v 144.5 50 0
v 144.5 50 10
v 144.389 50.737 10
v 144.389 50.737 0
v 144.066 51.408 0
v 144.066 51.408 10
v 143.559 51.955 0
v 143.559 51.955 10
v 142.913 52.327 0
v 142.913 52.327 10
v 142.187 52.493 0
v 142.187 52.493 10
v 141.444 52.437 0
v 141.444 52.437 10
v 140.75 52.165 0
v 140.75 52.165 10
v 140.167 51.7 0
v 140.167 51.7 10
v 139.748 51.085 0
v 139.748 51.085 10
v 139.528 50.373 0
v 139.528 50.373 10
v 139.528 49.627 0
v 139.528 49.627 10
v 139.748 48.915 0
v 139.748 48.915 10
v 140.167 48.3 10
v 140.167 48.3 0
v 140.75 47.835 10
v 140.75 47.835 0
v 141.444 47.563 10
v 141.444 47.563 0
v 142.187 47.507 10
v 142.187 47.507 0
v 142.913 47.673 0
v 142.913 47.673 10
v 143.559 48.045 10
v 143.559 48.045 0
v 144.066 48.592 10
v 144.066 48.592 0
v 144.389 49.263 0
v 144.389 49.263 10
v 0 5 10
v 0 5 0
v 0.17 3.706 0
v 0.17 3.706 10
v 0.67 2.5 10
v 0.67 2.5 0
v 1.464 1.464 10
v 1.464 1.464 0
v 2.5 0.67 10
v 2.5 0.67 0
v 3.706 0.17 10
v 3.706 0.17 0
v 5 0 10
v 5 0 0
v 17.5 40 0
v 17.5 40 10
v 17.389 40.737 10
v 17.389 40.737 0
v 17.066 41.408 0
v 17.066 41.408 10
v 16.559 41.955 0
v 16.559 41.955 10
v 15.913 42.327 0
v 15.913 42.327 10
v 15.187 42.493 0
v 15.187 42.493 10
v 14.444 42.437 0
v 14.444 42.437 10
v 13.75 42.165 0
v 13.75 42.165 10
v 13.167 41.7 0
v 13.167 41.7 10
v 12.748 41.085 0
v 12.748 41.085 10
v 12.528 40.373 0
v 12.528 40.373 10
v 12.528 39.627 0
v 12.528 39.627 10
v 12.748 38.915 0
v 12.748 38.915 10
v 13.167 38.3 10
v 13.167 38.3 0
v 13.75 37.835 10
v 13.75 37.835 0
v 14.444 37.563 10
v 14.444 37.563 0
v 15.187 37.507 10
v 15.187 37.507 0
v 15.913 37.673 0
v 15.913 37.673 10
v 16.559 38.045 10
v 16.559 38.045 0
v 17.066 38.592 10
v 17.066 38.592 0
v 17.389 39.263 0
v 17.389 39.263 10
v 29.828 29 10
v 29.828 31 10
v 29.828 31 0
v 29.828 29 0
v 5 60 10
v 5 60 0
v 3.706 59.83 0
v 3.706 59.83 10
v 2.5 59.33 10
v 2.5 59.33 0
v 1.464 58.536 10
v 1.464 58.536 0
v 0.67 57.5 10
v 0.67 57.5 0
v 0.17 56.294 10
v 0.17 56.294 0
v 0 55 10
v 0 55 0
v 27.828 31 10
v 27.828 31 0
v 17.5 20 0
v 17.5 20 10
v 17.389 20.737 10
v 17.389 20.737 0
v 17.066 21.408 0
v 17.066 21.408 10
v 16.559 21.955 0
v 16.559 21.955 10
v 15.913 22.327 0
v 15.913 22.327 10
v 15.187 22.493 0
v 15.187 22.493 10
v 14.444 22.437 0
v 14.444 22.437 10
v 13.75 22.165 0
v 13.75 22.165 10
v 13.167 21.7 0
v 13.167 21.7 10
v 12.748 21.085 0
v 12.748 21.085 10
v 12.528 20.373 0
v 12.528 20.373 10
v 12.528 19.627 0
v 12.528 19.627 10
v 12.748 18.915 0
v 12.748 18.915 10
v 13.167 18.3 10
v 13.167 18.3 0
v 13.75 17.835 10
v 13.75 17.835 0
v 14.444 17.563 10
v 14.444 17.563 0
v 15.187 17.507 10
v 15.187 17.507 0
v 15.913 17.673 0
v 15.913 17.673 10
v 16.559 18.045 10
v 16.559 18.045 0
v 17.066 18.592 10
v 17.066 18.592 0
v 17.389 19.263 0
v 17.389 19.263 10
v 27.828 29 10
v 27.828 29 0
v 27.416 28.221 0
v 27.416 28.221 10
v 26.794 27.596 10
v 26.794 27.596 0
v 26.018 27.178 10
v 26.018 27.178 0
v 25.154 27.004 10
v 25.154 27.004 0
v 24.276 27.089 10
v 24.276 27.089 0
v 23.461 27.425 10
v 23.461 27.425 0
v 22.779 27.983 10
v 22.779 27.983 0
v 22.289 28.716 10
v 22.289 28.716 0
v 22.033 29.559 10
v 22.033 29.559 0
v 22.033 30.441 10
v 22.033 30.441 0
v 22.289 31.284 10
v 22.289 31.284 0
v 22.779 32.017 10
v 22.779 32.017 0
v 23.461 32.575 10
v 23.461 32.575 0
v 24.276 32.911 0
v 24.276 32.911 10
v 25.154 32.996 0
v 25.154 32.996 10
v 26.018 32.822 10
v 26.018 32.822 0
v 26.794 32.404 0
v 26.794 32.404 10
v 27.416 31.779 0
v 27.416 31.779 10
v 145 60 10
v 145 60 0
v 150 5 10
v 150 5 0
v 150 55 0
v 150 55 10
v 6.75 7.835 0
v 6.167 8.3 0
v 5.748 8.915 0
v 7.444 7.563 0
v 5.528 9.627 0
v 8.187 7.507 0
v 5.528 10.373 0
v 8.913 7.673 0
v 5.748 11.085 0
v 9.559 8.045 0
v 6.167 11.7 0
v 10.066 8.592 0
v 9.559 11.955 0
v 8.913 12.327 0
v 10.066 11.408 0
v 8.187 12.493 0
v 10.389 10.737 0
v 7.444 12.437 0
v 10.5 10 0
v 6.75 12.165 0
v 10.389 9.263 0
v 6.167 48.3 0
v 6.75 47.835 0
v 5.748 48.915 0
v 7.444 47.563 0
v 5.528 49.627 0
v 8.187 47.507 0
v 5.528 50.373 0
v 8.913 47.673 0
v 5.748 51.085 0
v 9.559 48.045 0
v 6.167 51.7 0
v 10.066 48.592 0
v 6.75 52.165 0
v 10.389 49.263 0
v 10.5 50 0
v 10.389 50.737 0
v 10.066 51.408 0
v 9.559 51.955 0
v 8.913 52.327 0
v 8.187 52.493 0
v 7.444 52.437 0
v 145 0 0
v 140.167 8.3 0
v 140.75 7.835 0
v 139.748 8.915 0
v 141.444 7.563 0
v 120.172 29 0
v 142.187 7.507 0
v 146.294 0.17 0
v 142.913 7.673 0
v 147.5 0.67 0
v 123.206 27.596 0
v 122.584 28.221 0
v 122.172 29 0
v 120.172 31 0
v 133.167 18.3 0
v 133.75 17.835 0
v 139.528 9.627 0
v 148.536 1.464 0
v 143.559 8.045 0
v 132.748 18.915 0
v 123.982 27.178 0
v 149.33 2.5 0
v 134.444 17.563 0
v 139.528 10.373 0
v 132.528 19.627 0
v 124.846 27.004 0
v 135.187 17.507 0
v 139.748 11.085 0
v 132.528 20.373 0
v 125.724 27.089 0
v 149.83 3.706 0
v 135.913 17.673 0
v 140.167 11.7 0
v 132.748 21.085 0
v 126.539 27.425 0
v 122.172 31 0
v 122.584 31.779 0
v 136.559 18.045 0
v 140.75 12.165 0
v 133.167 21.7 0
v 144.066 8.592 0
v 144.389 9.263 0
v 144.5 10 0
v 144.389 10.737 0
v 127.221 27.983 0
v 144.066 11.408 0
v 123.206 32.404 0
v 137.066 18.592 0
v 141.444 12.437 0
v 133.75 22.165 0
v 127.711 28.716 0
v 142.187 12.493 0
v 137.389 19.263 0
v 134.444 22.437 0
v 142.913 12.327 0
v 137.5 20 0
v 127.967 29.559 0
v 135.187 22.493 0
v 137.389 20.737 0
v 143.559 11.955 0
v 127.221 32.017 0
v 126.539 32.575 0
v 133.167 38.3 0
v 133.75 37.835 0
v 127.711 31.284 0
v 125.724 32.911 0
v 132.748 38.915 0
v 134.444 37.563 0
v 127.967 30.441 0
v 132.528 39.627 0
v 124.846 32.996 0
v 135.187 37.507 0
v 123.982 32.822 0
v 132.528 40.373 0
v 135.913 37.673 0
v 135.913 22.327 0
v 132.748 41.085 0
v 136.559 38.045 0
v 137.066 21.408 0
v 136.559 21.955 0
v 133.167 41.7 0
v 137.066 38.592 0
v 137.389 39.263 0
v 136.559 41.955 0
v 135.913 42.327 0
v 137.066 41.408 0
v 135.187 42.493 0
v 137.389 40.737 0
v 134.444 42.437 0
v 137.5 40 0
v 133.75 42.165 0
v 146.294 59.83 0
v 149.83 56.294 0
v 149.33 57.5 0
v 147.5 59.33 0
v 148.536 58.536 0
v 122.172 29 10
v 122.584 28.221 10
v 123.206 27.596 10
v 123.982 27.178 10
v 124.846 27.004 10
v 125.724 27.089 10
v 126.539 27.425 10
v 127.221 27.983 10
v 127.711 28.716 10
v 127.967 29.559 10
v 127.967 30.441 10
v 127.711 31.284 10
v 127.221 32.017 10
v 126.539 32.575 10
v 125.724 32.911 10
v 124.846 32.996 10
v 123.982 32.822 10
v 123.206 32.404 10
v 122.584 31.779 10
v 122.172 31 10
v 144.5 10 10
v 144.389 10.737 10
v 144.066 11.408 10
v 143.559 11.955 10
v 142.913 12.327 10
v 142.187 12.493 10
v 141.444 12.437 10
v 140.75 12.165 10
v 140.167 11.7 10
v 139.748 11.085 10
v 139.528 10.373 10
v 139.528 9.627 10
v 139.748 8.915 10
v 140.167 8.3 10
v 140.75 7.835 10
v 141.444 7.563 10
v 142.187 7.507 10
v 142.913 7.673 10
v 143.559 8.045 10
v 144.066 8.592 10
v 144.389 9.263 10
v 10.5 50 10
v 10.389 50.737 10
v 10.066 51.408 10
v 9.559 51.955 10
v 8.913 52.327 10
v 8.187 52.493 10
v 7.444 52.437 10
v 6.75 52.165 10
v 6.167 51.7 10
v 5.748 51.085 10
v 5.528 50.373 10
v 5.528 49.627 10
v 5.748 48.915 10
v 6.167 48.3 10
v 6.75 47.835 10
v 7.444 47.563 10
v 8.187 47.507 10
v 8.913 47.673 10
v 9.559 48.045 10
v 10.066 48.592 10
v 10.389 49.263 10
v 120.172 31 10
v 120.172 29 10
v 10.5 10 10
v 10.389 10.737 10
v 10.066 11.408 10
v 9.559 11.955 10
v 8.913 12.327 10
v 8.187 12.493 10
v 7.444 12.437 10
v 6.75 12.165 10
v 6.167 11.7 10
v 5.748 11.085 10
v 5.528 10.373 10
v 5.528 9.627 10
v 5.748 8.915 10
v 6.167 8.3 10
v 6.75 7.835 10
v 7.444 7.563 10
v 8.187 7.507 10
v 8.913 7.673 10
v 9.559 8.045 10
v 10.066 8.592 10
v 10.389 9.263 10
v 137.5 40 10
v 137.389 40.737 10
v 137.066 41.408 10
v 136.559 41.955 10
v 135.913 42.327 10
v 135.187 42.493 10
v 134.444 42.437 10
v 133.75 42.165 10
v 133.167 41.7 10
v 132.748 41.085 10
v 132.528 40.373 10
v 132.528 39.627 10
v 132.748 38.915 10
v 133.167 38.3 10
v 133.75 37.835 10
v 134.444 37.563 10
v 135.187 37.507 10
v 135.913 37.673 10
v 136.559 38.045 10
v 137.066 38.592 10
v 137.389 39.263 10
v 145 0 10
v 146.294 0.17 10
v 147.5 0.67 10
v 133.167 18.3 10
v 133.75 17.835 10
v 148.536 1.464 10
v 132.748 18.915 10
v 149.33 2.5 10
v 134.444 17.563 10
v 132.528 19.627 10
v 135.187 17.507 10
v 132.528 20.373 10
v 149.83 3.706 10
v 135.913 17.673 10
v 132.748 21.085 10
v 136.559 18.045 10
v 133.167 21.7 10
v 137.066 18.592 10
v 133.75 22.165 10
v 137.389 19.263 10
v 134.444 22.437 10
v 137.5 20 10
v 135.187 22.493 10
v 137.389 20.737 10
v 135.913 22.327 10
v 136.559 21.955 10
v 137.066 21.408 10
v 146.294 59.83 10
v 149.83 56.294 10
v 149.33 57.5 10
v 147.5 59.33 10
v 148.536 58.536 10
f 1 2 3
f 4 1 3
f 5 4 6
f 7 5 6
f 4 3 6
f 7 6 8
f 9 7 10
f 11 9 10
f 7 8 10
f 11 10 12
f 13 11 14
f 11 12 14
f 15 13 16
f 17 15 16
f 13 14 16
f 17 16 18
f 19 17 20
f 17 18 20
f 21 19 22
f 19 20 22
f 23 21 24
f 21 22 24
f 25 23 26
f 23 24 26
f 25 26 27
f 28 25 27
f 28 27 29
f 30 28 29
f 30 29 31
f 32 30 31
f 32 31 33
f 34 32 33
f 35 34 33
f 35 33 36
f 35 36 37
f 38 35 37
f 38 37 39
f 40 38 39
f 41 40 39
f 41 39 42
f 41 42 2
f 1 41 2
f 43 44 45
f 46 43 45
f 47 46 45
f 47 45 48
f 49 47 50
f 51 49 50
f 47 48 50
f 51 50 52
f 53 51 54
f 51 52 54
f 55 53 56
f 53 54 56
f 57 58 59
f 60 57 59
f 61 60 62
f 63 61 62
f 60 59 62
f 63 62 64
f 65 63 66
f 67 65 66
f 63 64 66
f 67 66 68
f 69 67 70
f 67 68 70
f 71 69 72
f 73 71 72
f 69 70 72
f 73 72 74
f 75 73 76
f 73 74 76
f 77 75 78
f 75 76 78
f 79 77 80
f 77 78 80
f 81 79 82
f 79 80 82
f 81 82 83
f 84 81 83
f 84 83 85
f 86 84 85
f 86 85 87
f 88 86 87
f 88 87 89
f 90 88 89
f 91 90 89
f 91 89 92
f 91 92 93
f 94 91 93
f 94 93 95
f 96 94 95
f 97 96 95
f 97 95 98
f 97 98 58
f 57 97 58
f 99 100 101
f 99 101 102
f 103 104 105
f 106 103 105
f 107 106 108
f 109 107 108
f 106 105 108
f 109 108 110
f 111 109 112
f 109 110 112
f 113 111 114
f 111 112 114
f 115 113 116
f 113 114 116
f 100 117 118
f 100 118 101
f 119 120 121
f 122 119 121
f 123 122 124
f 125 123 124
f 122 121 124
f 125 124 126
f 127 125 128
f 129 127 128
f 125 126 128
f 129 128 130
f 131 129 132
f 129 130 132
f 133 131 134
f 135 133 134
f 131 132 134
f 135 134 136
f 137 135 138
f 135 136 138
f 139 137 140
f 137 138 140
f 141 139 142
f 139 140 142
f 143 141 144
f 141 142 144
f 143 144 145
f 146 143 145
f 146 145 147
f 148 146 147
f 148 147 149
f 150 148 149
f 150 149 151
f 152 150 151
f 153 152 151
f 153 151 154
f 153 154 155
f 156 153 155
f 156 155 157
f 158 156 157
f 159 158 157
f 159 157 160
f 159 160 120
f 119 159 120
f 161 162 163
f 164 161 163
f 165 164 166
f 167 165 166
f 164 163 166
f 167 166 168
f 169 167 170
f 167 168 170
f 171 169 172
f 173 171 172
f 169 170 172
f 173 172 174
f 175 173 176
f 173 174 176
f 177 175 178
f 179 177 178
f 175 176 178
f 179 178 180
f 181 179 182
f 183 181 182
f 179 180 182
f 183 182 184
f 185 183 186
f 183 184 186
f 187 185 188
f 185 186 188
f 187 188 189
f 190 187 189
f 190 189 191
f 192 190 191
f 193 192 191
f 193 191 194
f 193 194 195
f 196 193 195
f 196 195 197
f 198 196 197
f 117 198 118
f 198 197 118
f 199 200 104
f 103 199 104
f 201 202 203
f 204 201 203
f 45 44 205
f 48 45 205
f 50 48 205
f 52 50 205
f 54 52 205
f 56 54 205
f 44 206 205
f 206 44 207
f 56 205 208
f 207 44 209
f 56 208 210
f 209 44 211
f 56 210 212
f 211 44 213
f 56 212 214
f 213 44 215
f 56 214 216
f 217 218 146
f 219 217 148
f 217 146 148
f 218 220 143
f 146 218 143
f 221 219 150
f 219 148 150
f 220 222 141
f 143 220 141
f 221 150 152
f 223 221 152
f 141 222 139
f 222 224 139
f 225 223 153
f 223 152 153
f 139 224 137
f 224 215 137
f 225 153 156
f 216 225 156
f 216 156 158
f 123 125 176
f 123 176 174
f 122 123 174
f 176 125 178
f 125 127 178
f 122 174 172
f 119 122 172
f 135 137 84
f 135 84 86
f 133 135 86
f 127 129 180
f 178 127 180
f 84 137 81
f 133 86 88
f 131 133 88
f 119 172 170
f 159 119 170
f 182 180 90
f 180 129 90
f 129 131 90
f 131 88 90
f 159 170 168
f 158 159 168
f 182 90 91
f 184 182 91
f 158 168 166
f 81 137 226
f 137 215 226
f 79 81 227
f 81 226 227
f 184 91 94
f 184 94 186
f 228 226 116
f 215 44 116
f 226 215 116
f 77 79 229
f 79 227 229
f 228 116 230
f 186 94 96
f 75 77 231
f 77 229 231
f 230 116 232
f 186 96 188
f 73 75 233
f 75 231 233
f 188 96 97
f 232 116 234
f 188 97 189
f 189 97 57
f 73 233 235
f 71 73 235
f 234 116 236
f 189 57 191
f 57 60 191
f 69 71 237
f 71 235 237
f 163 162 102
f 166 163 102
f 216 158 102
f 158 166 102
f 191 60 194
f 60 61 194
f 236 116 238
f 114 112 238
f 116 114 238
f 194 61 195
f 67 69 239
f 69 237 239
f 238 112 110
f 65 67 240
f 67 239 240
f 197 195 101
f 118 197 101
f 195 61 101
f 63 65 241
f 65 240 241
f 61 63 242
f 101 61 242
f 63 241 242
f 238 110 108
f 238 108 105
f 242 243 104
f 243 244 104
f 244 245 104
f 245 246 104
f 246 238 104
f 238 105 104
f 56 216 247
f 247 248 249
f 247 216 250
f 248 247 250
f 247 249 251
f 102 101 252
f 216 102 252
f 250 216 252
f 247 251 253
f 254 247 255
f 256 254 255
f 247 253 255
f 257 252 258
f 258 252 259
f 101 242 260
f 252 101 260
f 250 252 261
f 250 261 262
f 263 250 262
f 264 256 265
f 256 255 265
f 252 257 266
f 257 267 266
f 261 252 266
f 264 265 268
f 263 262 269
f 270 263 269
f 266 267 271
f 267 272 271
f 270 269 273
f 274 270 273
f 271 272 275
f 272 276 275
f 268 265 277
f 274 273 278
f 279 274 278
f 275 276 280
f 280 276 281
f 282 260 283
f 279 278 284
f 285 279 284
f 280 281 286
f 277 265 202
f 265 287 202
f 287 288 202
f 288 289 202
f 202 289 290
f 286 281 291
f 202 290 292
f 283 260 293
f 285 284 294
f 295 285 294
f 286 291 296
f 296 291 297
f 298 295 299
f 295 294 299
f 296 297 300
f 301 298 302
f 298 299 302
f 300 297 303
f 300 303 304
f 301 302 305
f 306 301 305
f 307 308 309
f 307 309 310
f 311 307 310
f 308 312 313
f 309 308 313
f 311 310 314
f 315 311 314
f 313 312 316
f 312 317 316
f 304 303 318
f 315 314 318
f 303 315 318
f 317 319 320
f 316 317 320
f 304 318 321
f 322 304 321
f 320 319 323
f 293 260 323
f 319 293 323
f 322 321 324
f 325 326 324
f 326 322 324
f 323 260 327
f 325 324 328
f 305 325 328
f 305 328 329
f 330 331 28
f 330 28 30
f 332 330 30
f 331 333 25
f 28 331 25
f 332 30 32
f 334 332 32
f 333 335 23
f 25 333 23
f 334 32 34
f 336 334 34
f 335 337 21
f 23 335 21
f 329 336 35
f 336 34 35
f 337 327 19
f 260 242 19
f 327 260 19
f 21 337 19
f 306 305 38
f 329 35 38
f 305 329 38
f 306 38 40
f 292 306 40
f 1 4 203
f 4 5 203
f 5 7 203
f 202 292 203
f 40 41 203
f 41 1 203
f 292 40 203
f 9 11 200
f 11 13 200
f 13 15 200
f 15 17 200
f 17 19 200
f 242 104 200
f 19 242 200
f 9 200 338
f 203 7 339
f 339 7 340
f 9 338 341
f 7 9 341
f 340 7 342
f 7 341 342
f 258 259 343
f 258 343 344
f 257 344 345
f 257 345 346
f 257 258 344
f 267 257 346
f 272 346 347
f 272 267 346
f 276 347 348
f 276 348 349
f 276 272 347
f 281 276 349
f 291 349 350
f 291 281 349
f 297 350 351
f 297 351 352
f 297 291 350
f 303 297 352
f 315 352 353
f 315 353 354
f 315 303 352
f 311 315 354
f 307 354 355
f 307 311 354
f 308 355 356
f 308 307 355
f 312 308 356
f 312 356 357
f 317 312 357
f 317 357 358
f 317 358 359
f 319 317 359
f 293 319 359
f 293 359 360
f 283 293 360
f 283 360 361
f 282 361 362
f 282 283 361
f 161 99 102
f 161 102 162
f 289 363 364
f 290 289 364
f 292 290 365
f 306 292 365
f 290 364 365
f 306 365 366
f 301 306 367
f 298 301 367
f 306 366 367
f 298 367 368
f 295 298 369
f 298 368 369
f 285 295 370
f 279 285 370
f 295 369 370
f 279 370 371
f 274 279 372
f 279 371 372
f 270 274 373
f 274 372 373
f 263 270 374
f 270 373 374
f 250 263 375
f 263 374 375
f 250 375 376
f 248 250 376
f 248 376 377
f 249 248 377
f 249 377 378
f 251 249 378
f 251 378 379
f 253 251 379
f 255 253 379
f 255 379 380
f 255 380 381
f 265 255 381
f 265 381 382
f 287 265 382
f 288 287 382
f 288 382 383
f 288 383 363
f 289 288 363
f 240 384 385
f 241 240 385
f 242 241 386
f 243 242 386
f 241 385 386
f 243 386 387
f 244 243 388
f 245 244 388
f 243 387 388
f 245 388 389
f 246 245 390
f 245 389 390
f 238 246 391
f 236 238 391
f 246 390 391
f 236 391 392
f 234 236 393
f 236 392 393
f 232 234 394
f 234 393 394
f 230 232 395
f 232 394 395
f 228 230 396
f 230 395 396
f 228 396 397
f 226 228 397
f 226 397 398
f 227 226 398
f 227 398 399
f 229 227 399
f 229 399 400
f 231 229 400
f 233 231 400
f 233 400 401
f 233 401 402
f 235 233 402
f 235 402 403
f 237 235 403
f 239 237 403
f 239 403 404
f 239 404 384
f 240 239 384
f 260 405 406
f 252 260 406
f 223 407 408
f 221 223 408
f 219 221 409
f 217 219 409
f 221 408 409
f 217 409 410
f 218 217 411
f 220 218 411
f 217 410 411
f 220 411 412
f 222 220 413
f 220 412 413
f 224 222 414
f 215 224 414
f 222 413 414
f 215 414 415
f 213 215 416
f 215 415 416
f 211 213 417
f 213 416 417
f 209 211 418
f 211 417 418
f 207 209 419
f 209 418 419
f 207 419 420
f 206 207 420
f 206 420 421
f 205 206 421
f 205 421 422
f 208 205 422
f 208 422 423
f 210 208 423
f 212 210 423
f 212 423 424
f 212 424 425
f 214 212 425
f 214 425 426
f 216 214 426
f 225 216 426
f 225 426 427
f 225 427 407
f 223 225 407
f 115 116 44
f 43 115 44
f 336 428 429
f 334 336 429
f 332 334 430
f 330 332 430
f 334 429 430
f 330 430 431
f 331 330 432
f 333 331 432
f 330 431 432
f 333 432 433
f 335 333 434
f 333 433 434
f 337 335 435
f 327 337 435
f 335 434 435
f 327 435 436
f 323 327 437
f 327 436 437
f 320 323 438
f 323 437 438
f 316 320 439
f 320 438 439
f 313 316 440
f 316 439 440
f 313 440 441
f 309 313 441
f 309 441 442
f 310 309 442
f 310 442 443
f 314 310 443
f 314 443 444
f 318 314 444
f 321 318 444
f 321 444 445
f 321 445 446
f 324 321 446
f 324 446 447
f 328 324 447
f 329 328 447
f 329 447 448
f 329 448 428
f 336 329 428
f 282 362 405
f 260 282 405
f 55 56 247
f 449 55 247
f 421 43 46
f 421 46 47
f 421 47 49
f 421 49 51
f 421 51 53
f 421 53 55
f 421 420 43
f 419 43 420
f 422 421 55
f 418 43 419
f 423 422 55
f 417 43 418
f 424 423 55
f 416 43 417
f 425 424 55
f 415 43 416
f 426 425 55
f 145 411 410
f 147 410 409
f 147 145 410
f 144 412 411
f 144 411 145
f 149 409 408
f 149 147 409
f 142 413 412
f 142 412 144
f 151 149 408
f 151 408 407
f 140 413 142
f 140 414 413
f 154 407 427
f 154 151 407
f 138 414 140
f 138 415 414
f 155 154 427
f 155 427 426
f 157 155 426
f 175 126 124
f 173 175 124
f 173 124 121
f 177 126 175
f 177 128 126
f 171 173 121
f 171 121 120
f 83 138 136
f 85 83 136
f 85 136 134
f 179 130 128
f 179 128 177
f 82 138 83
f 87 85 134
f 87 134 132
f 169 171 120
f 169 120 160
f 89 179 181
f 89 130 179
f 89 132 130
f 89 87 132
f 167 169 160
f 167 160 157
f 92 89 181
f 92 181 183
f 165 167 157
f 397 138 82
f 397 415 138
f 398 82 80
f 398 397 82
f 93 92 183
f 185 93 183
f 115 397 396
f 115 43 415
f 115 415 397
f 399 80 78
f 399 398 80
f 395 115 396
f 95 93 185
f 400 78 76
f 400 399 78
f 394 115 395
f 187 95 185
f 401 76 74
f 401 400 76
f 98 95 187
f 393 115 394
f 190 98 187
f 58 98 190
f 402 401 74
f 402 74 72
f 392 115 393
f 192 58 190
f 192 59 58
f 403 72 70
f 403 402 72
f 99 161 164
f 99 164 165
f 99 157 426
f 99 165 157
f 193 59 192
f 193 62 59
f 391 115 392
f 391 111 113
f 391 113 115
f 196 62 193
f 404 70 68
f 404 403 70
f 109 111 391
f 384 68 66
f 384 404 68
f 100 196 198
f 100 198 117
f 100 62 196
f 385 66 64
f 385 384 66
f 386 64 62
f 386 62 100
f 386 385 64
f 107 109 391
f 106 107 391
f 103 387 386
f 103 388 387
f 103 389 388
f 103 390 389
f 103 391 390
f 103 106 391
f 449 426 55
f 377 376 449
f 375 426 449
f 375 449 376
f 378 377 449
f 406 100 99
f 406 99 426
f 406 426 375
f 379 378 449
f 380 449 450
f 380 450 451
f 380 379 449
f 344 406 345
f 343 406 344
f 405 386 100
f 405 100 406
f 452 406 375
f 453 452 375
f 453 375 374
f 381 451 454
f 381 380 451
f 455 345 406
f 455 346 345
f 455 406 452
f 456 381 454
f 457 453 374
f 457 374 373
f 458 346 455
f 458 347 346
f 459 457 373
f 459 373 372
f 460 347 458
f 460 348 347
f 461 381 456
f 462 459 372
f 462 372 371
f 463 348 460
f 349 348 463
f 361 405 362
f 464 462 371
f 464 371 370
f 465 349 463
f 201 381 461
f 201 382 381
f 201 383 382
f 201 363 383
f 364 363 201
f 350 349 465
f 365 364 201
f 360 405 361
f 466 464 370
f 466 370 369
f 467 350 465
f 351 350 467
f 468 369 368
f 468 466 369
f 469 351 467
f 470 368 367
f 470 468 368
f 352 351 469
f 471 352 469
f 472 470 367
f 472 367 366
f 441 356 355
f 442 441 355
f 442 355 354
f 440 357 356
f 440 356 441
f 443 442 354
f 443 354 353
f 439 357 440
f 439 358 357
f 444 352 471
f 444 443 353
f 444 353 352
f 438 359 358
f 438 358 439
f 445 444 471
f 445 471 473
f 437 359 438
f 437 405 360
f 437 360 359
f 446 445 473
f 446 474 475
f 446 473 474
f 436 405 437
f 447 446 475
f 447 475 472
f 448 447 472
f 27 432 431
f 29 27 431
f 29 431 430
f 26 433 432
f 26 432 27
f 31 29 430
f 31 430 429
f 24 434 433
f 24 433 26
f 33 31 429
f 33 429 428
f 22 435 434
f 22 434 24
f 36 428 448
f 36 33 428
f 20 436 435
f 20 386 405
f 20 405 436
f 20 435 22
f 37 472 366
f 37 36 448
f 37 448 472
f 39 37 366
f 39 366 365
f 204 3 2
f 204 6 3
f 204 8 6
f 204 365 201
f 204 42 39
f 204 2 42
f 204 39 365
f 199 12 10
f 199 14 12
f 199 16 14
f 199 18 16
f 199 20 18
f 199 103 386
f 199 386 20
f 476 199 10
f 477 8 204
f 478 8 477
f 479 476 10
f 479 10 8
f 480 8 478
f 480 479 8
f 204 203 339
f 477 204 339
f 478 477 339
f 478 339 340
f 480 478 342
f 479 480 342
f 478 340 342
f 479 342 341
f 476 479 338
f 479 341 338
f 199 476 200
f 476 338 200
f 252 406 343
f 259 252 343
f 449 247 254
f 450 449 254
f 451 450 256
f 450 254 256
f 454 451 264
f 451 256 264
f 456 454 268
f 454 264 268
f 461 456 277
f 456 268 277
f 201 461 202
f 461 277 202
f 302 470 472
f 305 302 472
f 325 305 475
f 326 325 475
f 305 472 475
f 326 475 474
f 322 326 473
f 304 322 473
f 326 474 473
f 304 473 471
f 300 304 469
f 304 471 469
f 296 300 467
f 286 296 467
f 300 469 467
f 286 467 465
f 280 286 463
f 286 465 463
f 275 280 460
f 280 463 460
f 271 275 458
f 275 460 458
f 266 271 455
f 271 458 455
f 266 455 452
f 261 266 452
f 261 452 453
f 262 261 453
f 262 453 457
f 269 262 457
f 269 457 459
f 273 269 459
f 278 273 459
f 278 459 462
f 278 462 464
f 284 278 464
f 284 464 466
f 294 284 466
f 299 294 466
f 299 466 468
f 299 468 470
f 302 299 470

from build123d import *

# Parameters (mm, degrees)
BOSS_EXTRUDE1_DEPTH = 10
SKETCH2_R           = 2.5
CUT_EXTRUDE1_DEPTH  = 11
SKETCH3_R           = 2.5
CUT_EXTRUDE3_DEPTH  = 11


with BuildPart() as part:
    # Sketch1 → Boss-Extrude1 (new body)
    with BuildSketch(Plane.XY):
        with BuildLine():
            Line((5, 0), (145, 0))
            ThreePointArc((145, 0), (148.535533906, 1.464466094), (150, 5))
            Line((150, 5), (150, 55))
            ThreePointArc((150, 55), (148.535533906, 58.535533906), (145, 60))
            Line((145, 60), (5, 60))
            ThreePointArc((5, 60), (1.464466094, 58.535533906), (0, 55))
            Line((0, 55), (0, 5))
            ThreePointArc((0, 5), (1.464466094, 1.464466094), (5, 0))
        make_face()
        with BuildLine():
            Line((27.828427125, 31), (29.828427125, 31))
            Line((29.828427125, 31), (29.828427125, 29))
            Line((29.828427125, 29), (27.828427125, 29))
            ThreePointArc((27.828427125, 29), (22, 30), (27.828427125, 31))
        make_face(mode=Mode.SUBTRACT)
        with BuildLine():
            Line((122.171572875, 31), (120.171572875, 31))
            Line((120.171572875, 31), (120.171572875, 29))
            Line((120.171572875, 29), (122.171572875, 29))
            ThreePointArc((122.171572875, 29), (128, 30), (122.171572875, 31))
        make_face(mode=Mode.SUBTRACT)
    extrude(amount=BOSS_EXTRUDE1_DEPTH)

    # Sketch2 → Cut-Extrude1 (cut, through all)
    with BuildSketch(Plane.XY.offset(10)):
        with Locations((15, 40)):
            Circle(SKETCH2_R)
        with Locations((15, 20)):
            Circle(SKETCH2_R)
        with Locations((135, 40)):
            Circle(SKETCH2_R)
        with Locations((135, 20)):
            Circle(SKETCH2_R)
    extrude(amount=-CUT_EXTRUDE1_DEPTH, mode=Mode.SUBTRACT)

    # Sketch3 → Cut-Extrude3 (cut, through all)
    with BuildSketch(Plane.XY.offset(10)):
        with Locations((8, 50)):
            Circle(SKETCH3_R)
        with Locations((8, 10)):
            Circle(SKETCH3_R)
        with Locations((142, 50)):
            Circle(SKETCH3_R)
        with Locations((142, 10)):
            Circle(SKETCH3_R)
    extrude(amount=-CUT_EXTRUDE3_DEPTH, mode=Mode.SUBTRACT)


solid = part.part
